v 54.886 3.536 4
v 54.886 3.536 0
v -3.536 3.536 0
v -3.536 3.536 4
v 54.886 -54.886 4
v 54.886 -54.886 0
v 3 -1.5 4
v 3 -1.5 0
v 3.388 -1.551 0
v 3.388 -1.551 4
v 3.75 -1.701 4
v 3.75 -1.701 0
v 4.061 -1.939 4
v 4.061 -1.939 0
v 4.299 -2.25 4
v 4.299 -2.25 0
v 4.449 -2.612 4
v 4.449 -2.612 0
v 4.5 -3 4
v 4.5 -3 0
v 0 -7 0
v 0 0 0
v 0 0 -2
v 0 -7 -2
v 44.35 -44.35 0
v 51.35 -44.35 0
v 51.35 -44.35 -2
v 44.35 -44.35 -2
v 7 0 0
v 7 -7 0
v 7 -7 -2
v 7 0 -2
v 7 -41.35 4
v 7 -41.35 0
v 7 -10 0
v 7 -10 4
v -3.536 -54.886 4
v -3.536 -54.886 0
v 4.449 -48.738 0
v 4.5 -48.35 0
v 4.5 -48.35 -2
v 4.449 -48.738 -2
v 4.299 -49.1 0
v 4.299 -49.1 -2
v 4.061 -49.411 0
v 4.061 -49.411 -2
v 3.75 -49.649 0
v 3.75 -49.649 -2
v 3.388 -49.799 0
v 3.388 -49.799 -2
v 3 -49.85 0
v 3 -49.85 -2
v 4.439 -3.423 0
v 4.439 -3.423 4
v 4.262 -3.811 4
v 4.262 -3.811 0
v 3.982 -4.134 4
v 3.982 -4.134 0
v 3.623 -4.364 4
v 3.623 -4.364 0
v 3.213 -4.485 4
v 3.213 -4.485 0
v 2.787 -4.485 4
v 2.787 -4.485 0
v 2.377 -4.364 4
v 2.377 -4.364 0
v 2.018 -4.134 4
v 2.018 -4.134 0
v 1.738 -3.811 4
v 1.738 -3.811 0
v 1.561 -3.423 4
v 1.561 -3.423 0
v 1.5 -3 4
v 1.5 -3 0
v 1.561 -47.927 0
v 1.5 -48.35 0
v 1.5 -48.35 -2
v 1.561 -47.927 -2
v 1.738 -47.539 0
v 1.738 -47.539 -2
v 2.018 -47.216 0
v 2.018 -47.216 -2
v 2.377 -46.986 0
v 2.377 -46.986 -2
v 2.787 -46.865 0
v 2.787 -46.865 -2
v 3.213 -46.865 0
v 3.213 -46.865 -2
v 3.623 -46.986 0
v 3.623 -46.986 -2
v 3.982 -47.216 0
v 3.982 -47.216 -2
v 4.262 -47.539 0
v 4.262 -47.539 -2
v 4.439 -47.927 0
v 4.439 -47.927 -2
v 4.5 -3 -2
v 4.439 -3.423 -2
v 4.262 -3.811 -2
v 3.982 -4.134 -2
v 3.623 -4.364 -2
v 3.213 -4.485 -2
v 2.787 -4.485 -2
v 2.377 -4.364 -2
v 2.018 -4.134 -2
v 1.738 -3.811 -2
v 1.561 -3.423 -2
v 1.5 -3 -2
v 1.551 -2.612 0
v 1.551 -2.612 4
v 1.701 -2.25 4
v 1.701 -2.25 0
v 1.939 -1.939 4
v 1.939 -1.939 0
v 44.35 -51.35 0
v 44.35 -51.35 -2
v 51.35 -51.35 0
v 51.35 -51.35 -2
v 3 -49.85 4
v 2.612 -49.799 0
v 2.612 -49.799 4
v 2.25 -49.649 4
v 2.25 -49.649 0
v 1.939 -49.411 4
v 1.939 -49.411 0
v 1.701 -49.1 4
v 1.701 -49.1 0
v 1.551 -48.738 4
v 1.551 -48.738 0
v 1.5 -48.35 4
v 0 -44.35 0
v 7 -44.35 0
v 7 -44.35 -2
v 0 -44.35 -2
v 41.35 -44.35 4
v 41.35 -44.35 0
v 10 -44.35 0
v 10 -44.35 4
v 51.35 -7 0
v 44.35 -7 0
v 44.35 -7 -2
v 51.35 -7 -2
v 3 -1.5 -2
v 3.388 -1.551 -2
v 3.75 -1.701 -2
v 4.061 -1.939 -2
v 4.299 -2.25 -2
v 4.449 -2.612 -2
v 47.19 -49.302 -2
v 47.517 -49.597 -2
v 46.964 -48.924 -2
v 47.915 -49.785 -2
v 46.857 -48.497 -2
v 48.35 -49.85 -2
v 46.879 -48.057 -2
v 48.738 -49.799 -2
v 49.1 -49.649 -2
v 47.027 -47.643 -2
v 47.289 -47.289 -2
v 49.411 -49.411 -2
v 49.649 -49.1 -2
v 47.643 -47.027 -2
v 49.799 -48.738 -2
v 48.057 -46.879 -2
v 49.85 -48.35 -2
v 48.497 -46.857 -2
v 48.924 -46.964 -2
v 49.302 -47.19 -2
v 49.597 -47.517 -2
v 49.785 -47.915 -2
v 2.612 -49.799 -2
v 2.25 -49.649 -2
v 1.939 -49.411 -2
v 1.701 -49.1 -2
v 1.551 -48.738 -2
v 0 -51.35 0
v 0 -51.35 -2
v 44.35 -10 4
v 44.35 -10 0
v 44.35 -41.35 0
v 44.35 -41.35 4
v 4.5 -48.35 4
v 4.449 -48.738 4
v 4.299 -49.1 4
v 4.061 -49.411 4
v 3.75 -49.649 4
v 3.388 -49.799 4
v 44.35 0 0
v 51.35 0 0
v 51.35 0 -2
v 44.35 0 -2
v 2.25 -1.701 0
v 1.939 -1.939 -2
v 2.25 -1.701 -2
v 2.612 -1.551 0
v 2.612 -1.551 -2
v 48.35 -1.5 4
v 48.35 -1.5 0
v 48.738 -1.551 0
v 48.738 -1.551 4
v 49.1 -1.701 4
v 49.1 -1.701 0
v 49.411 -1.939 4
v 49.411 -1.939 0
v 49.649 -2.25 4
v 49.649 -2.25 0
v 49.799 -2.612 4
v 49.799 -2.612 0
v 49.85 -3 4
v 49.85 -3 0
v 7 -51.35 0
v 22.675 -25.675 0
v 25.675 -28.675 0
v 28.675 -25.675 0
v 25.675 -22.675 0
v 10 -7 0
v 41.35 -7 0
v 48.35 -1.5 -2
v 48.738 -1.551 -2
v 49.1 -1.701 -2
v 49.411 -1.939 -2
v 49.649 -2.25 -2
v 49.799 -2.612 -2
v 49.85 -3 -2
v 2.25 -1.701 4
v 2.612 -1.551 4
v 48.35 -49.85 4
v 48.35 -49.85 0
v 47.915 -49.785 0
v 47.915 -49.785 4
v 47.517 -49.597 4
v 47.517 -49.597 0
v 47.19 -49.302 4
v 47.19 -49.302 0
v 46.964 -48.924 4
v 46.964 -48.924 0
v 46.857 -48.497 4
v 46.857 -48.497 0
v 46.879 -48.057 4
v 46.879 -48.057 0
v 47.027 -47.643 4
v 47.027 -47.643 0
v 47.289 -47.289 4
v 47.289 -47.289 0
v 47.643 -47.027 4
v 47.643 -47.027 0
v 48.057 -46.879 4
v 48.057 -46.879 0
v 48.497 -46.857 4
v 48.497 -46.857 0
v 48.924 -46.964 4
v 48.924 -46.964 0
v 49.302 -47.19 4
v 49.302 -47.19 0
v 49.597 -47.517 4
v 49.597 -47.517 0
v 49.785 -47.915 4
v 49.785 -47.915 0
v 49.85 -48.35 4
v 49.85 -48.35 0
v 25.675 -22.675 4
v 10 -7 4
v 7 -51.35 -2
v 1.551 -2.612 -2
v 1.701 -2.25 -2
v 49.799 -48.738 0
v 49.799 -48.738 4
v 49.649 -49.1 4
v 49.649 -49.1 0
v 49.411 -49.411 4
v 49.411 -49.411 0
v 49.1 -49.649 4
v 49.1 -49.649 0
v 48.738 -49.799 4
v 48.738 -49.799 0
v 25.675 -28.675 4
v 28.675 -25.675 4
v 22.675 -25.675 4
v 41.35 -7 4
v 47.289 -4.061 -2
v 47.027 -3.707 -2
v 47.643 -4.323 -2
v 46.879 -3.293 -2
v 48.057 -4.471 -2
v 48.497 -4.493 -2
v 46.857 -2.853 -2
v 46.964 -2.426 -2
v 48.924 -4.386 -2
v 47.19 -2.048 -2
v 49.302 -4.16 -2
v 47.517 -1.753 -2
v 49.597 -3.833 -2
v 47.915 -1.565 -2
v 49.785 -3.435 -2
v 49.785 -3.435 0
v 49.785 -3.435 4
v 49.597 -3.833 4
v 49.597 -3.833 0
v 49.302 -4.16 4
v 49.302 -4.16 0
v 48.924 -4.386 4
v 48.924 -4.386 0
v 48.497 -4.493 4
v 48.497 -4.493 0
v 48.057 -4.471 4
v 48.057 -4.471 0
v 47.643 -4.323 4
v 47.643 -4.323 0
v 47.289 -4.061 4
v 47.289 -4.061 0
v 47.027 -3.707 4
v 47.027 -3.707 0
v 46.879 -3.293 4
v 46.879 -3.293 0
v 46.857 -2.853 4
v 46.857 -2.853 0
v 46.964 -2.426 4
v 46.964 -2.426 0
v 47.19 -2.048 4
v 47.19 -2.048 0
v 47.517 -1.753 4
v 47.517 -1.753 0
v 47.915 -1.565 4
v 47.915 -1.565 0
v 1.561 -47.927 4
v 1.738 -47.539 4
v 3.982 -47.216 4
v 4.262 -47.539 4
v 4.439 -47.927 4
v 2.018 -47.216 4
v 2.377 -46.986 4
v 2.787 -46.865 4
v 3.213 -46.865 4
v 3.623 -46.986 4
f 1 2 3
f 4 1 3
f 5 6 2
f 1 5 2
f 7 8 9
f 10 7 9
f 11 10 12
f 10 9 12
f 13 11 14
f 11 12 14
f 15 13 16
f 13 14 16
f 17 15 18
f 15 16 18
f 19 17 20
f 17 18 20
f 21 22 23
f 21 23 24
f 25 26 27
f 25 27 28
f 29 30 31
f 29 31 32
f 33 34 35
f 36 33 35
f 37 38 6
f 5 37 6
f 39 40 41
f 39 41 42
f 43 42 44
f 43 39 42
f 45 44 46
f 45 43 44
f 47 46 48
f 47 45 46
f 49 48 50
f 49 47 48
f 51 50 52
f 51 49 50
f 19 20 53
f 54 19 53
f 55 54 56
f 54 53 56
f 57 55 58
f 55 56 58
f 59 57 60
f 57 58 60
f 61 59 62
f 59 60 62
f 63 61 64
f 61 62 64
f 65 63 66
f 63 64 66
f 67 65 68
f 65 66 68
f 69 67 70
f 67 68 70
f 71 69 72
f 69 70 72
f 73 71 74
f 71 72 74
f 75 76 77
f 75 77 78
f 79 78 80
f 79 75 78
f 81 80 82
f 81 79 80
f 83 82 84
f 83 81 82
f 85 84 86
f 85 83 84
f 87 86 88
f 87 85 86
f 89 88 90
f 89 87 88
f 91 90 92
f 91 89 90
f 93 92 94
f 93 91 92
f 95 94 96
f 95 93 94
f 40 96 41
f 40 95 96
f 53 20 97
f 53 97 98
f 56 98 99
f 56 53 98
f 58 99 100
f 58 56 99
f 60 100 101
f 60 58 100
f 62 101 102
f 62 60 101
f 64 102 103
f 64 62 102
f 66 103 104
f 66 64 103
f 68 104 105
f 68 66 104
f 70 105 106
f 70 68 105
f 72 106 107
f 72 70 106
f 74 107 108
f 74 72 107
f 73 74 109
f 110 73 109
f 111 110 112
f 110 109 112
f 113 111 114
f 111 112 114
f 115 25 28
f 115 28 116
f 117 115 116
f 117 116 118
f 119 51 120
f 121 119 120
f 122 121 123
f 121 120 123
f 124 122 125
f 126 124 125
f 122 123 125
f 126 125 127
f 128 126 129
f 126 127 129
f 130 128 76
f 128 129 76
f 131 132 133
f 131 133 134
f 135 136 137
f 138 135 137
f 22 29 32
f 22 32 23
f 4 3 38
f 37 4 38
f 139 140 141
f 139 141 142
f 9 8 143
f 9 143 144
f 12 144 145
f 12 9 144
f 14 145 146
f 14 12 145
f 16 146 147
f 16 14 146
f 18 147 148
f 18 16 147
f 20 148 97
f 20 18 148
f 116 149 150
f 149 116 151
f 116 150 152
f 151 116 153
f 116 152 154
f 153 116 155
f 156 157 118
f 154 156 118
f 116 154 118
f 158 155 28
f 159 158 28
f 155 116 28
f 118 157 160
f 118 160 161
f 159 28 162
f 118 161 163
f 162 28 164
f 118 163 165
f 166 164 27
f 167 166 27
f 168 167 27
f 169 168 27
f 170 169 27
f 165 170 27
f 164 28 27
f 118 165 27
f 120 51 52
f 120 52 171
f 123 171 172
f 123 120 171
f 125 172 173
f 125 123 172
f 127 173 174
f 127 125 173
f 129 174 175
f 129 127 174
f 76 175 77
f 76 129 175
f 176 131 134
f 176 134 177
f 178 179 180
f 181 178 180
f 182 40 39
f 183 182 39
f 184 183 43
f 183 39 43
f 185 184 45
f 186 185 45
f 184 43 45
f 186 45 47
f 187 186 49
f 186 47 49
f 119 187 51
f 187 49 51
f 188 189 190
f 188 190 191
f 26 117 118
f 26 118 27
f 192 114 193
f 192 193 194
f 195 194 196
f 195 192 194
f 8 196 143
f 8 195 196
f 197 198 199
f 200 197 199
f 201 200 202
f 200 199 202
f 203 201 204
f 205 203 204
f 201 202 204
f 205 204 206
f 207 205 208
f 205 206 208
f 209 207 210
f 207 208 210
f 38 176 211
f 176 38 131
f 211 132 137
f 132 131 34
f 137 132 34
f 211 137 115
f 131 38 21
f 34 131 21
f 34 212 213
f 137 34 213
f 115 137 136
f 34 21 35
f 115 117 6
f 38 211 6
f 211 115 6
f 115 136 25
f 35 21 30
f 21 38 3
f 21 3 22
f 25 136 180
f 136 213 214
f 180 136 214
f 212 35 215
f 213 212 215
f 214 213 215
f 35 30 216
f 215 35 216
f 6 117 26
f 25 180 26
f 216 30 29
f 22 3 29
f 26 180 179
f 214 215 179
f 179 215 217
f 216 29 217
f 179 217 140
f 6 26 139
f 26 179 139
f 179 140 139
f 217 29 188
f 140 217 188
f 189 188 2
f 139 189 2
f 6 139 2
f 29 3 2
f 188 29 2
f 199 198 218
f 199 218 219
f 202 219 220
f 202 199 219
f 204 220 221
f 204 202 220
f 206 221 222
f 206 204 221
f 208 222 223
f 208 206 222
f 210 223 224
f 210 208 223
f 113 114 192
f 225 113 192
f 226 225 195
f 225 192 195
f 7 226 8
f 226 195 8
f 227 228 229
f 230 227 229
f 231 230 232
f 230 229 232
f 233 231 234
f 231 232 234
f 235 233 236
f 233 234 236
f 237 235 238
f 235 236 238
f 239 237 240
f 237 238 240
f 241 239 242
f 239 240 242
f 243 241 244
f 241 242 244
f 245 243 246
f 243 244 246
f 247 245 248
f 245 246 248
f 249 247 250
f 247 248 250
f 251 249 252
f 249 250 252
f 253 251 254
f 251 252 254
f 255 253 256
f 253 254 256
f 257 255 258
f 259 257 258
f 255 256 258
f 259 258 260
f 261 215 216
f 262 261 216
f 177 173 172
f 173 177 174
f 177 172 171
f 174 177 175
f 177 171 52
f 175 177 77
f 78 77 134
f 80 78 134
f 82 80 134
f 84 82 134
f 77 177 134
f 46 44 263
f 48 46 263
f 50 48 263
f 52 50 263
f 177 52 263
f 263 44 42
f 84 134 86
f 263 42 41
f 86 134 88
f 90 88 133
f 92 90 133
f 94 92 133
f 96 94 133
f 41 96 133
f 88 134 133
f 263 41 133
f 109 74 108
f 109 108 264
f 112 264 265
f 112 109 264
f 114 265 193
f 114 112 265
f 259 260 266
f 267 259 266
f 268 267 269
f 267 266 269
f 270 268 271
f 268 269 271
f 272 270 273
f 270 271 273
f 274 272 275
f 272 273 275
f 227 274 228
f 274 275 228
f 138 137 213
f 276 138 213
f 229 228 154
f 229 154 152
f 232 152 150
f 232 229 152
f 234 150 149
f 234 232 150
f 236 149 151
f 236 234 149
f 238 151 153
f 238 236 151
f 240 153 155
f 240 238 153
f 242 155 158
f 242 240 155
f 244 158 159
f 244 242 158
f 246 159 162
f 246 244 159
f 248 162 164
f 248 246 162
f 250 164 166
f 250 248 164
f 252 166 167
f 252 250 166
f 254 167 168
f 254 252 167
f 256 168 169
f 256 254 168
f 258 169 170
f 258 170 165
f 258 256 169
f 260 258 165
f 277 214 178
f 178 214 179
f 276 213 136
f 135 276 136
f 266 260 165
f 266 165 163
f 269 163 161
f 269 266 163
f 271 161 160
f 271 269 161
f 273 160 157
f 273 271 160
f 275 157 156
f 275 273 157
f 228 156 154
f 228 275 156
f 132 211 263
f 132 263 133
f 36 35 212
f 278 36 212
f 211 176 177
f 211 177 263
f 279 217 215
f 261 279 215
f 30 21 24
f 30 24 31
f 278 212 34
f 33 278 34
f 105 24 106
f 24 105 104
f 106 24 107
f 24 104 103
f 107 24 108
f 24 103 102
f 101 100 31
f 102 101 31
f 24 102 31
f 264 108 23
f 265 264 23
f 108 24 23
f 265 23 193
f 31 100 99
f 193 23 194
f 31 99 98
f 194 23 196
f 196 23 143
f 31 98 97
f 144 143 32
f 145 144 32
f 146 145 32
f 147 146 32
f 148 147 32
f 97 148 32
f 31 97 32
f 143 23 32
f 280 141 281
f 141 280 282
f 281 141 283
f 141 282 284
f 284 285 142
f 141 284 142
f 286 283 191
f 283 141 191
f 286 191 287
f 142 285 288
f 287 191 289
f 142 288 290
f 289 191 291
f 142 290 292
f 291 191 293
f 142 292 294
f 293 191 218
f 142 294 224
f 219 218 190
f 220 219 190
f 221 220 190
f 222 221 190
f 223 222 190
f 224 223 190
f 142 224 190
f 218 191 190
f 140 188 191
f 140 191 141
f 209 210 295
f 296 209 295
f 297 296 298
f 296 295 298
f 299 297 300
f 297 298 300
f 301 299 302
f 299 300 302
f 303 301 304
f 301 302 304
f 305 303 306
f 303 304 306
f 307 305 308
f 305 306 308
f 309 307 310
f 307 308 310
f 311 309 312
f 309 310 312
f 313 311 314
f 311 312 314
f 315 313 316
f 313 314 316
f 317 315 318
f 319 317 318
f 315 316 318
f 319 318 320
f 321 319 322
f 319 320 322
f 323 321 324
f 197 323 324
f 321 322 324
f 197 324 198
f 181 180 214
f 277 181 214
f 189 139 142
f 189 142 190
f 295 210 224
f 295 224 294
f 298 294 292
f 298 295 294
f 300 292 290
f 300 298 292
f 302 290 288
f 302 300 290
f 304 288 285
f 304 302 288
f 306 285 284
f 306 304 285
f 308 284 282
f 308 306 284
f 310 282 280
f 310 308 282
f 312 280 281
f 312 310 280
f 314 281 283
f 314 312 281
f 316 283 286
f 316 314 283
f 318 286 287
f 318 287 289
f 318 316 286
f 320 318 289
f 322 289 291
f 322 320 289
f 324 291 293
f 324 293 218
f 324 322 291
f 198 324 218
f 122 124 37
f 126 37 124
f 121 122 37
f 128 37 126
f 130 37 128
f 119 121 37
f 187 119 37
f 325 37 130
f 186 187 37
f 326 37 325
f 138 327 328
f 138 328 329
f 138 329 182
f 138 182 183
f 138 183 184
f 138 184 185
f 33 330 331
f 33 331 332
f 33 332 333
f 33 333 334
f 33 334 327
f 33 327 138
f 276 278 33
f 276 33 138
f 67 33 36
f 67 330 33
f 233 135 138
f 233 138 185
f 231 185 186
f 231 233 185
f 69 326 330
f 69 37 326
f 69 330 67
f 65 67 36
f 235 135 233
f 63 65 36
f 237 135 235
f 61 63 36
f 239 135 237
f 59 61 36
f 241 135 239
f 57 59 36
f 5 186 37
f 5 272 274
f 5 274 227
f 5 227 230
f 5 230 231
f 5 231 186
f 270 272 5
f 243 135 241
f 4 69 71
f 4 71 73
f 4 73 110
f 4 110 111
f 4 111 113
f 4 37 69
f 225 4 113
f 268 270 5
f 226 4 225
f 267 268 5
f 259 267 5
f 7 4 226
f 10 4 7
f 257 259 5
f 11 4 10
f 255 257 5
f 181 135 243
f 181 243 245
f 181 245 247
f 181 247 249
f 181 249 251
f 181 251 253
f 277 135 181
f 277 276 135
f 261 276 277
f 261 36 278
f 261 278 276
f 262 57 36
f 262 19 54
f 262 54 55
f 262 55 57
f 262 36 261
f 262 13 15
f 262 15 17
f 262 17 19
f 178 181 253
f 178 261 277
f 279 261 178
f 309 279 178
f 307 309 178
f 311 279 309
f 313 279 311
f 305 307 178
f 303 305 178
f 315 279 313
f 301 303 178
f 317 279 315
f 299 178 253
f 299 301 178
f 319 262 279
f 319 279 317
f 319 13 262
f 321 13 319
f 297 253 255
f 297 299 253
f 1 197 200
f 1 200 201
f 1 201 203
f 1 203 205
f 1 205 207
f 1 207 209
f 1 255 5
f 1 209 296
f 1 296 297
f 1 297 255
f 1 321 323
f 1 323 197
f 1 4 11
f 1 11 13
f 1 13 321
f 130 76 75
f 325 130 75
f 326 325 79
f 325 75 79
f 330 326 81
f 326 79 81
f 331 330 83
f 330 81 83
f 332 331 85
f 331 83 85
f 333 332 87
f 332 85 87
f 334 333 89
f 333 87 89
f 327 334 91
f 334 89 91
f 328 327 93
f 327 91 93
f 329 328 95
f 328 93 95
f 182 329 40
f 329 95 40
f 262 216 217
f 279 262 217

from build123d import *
from build123d import SkipClean  # not in build123d's __all__

# Parameters (mm, degrees)
F1_DEPTH = 4
F2_DEPTH = 2


with BuildPart() as f1:
    # F0 (on Top) → F1 (new body)
    with BuildSketch(Plane.XY):
        Polygon((0, -51.35), (-3.5355339059, -54.8855339059), (54.8855339059, -54.8855339059), (51.35, -51.35), (48.35, -51.35), (44.35, -51.35), (7, -51.35), (3, -51.35), align=None)
        Polygon((7, -7), (0, -7), (0, -44.35), (7, -44.35), (7, -41.3499993608), (7, -10), align=None)
        Polygon((10.0000006392, -44.35), (7, -44.35), (7, -51.35), (44.35, -51.35), (44.35, -44.35), (41.35, -44.35), align=None)
        with BuildLine():
            Line((7, -44.35), (0, -44.35))
            Line((0, -44.35), (0, -48.35))
            Line((0, -48.35), (1.5, -48.35))
            ThreePointArc((1.5, -48.35), (3, -46.85), (4.5, -48.35))
            ThreePointArc((4.5, -48.35), (4.0606601718, -49.4106601718), (3, -49.85))
            Line((3, -49.85), (3, -51.35))
            Line((3, -51.35), (7, -51.35))
            Line((7, -51.35), (7, -44.35))
        make_face()
        with BuildLine():
            Line((0, -48.35), (0, -51.35))
            Line((0, -51.35), (3, -51.35))
            Line((3, -51.35), (3, -49.85))
            ThreePointArc((3, -49.85), (1.9393398282, -49.4106601718), (1.5, -48.35))
            Line((1.5, -48.35), (0, -48.35))
        make_face()
        Polygon((0, -3), (0, 0), (-3.5355339059, 3.5355339059), (-3.5355339059, -54.8855339059), (0, -51.35), (0, -48.35), (0, -44.35), (0, -7), align=None)
        with BuildLine():
            Line((7, 0), (3, 0))
            Line((3, 0), (3, -1.5))
            ThreePointArc((3, -1.5), (4.0606601718, -1.9393398282), (4.5, -3))
            ThreePointArc((4.5, -3), (3, -4.5), (1.5, -3))
            Line((1.5, -3), (0, -3))
            Line((0, -3), (0, -7))
            Line((0, -7), (7, -7))
            Line((7, -7), (7, 0))
        make_face()
        with BuildLine():
            Line((3, 0), (0, 0))
            Line((0, 0), (1.9393398282, -1.9393398282))
            ThreePointArc((1.9393398282, -1.9393398282), (2.4259748515, -1.6141807012), (3, -1.5))
            Line((3, -1.5), (3, 0))
        make_face()
        with BuildLine():
            Line((1.9393398282, -1.9393398282), (0, 0))
            Line((0, 0), (0, -3))
            Line((0, -3), (1.5, -3))
            ThreePointArc((1.5, -3), (1.6141807012, -2.4259748515), (1.9393398282, -1.9393398282))
        make_face()
        Polygon((-3.5355339059, 3.5355339059), (0, 0), (3, 0), (7, 0), (44.35, 0), (48.35, 0), (51.35, 0), (54.8855339059, 3.5355339059), align=None)
        Polygon((44.35, 0), (7, 0), (7, -7), (10, -7), (41.3499993608, -7), (44.35, -7), align=None)
        with BuildLine():
            Line((48.35, 0), (44.35, 0))
            Line((44.35, 0), (44.35, -7))
            Line((44.35, -7), (51.35, -7))
            Line((51.35, -7), (51.35, -3))
            Line((51.35, -3), (49.85, -3))
            ThreePointArc((49.85, -3), (47.2893398282, -4.0606601718), (48.35, -1.5))
            Line((48.35, -1.5), (48.35, 0))
        make_face()
        with BuildLine():
            Line((51.35, -3), (51.35, 0))
            Line((51.35, 0), (48.35, 0))
            Line((48.35, 0), (48.35, -1.5))
            ThreePointArc((48.35, -1.5), (49.4106601718, -1.9393398282), (49.85, -3))
            Line((49.85, -3), (51.35, -3))
        make_face()
        Polygon((54.8855339059, -54.8855339059), (54.8855339059, 3.5355339059), (51.35, 0), (51.35, -3), (51.35, -7), (51.35, -44.35), (51.35, -48.35), (51.35, -51.35), align=None)
        Polygon((51.35, -7), (44.35, -7), (44.35, -10.0000006392), (44.35, -41.35), (44.35, -44.35), (51.35, -44.35), align=None)
        with BuildLine():
            Line((48.35, -51.35), (51.35, -51.35))
            Line((51.35, -51.35), (51.35, -48.35))
            Line((51.35, -48.35), (49.85, -48.35))
            ThreePointArc((49.85, -48.35), (49.4106601718, -49.4106601718), (48.35, -49.85))
            Line((48.35, -49.85), (48.35, -51.35))
        make_face()
        with BuildLine():
            Line((44.35, -51.35), (48.35, -51.35))
            Line((48.35, -51.35), (48.35, -49.85))
            ThreePointArc((48.35, -49.85), (47.2893398282, -47.2893398282), (49.85, -48.35))
            Line((49.85, -48.35), (51.35, -48.35))
            Line((51.35, -48.35), (51.35, -44.35))
            Line((51.35, -44.35), (44.35, -44.35))
            Line((44.35, -44.35), (44.35, -51.35))
        make_face()
        Polygon((7, -41.3499993608), (7, -44.35), (8.5000003196, -42.8499996804), align=None)
        Polygon((8.5000003196, -42.8499996804), (7, -44.35), (10.0000006392, -44.35), align=None)
        Polygon((8.5000003196, -42.8499996804), (10.0000006392, -44.35), (25.6750003196, -28.6750003196), (24.175, -27.175), align=None)
        Polygon((22.6749996804, -25.6749996804), (7, -41.3499993608), (8.5000003196, -42.8499996804), (24.175, -27.175), align=None)
        Polygon((8.5, -8.5), (7, -10), (22.6749996804, -25.6749996804), (24.1749996804, -24.1749996804), align=None)
        Polygon((25.6749996804, -22.6749996804), (10, -7), (8.5, -8.5), (24.1749996804, -24.1749996804), align=None)
        Polygon((27.175, -24.175), (25.6749996804, -22.6749996804), (24.1749996804, -24.1749996804), (25.675, -25.675), align=None)
        Polygon((27.1750003196, -27.1750003196), (28.6750003196, -25.6750003196), (27.175, -24.175), (25.675, -25.675), align=None)
        Polygon((25.675, -25.675), (24.175, -27.175), (25.6750003196, -28.6750003196), (27.1750003196, -27.1750003196), align=None)
        Polygon((24.1749996804, -24.1749996804), (22.6749996804, -25.6749996804), (24.175, -27.175), (25.675, -25.675), align=None)
        Polygon((25.6750003196, -28.6750003196), (41.35, -44.35), (42.85, -42.85), (27.1750003196, -27.1750003196), align=None)
        Polygon((42.85, -42.85), (44.35, -41.35), (28.6750003196, -25.6750003196), (27.1750003196, -27.1750003196), align=None)
        Polygon((8.5, -8.5), (7, -7), (7, -10), align=None)
        Polygon((10, -7), (7, -7), (8.5, -8.5), align=None)
        Polygon((28.6750003196, -25.6750003196), (44.35, -10.0000006392), (42.8499996804, -8.5000003196), (27.175, -24.175), align=None)
        Polygon((42.8499996804, -8.5000003196), (41.3499993608, -7), (25.6749996804, -22.6749996804), (27.175, -24.175), align=None)
        Polygon((44.35, -10.0000006392), (44.35, -7), (42.8499996804, -8.5000003196), align=None)
        Polygon((44.35, -44.35), (44.35, -41.35), (42.85, -42.85), align=None)
        Polygon((42.85, -42.85), (41.35, -44.35), (44.35, -44.35), align=None)
        Polygon((42.8499996804, -8.5000003196), (44.35, -7), (41.3499993608, -7), align=None)
    extrude(amount=F1_DEPTH)

    # F0 (on Top) → F2 (join)
    with BuildSketch(Plane.XY):
        with BuildLine():
            Line((7, -44.35), (0, -44.35))
            Line((0, -44.35), (0, -48.35))
            Line((0, -48.35), (1.5, -48.35))
            ThreePointArc((1.5, -48.35), (3, -46.85), (4.5, -48.35))
            ThreePointArc((4.5, -48.35), (4.0606601718, -49.4106601718), (3, -49.85))
            Line((3, -49.85), (3, -51.35))
            Line((3, -51.35), (7, -51.35))
            Line((7, -51.35), (7, -44.35))
        make_face()
        with BuildLine():
            Line((0, -48.35), (0, -51.35))
            Line((0, -51.35), (3, -51.35))
            Line((3, -51.35), (3, -49.85))
            ThreePointArc((3, -49.85), (1.9393398282, -49.4106601718), (1.5, -48.35))
            Line((1.5, -48.35), (0, -48.35))
        make_face()
        with BuildLine():
            Line((44.35, -51.35), (48.35, -51.35))
            Line((48.35, -51.35), (48.35, -49.85))
            ThreePointArc((48.35, -49.85), (47.2893398282, -47.2893398282), (49.85, -48.35))
            Line((49.85, -48.35), (51.35, -48.35))
            Line((51.35, -48.35), (51.35, -44.35))
            Line((51.35, -44.35), (44.35, -44.35))
            Line((44.35, -44.35), (44.35, -51.35))
        make_face()
        with BuildLine():
            Line((48.35, -51.35), (51.35, -51.35))
            Line((51.35, -51.35), (51.35, -48.35))
            Line((51.35, -48.35), (49.85, -48.35))
            ThreePointArc((49.85, -48.35), (49.4106601718, -49.4106601718), (48.35, -49.85))
            Line((48.35, -49.85), (48.35, -51.35))
        make_face()
        with BuildLine():
            Line((48.35, 0), (44.35, 0))
            Line((44.35, 0), (44.35, -7))
            Line((44.35, -7), (51.35, -7))
            Line((51.35, -7), (51.35, -3))
            Line((51.35, -3), (49.85, -3))
            ThreePointArc((49.85, -3), (47.2893398282, -4.0606601718), (48.35, -1.5))
            Line((48.35, -1.5), (48.35, 0))
        make_face()
        with BuildLine():
            Line((51.35, -3), (51.35, 0))
            Line((51.35, 0), (48.35, 0))
            Line((48.35, 0), (48.35, -1.5))
            ThreePointArc((48.35, -1.5), (49.4106601718, -1.9393398282), (49.85, -3))
            Line((49.85, -3), (51.35, -3))
        make_face()
        with BuildLine():
            Line((7, 0), (3, 0))
            Line((3, 0), (3, -1.5))
            ThreePointArc((3, -1.5), (4.0606601718, -1.9393398282), (4.5, -3))
            ThreePointArc((4.5, -3), (3, -4.5), (1.5, -3))
            Line((1.5, -3), (0, -3))
            Line((0, -3), (0, -7))
            Line((0, -7), (7, -7))
            Line((7, -7), (7, 0))
        make_face()
        with BuildLine():
            Line((1.9393398282, -1.9393398282), (0, 0))
            Line((0, 0), (0, -3))
            Line((0, -3), (1.5, -3))
            ThreePointArc((1.5, -3), (1.6141807012, -2.4259748515), (1.9393398282, -1.9393398282))
        make_face()
        with BuildLine():
            Line((3, 0), (0, 0))
            Line((0, 0), (1.9393398282, -1.9393398282))
            ThreePointArc((1.9393398282, -1.9393398282), (2.4259748515, -1.6141807012), (3, -1.5))
            Line((3, -1.5), (3, 0))
        make_face()
    with SkipClean():  # cleaning this boolean's faces spoils the solid; the shape is the same uncleaned
        extrude(amount=-F2_DEPTH)


solid = f1.part
